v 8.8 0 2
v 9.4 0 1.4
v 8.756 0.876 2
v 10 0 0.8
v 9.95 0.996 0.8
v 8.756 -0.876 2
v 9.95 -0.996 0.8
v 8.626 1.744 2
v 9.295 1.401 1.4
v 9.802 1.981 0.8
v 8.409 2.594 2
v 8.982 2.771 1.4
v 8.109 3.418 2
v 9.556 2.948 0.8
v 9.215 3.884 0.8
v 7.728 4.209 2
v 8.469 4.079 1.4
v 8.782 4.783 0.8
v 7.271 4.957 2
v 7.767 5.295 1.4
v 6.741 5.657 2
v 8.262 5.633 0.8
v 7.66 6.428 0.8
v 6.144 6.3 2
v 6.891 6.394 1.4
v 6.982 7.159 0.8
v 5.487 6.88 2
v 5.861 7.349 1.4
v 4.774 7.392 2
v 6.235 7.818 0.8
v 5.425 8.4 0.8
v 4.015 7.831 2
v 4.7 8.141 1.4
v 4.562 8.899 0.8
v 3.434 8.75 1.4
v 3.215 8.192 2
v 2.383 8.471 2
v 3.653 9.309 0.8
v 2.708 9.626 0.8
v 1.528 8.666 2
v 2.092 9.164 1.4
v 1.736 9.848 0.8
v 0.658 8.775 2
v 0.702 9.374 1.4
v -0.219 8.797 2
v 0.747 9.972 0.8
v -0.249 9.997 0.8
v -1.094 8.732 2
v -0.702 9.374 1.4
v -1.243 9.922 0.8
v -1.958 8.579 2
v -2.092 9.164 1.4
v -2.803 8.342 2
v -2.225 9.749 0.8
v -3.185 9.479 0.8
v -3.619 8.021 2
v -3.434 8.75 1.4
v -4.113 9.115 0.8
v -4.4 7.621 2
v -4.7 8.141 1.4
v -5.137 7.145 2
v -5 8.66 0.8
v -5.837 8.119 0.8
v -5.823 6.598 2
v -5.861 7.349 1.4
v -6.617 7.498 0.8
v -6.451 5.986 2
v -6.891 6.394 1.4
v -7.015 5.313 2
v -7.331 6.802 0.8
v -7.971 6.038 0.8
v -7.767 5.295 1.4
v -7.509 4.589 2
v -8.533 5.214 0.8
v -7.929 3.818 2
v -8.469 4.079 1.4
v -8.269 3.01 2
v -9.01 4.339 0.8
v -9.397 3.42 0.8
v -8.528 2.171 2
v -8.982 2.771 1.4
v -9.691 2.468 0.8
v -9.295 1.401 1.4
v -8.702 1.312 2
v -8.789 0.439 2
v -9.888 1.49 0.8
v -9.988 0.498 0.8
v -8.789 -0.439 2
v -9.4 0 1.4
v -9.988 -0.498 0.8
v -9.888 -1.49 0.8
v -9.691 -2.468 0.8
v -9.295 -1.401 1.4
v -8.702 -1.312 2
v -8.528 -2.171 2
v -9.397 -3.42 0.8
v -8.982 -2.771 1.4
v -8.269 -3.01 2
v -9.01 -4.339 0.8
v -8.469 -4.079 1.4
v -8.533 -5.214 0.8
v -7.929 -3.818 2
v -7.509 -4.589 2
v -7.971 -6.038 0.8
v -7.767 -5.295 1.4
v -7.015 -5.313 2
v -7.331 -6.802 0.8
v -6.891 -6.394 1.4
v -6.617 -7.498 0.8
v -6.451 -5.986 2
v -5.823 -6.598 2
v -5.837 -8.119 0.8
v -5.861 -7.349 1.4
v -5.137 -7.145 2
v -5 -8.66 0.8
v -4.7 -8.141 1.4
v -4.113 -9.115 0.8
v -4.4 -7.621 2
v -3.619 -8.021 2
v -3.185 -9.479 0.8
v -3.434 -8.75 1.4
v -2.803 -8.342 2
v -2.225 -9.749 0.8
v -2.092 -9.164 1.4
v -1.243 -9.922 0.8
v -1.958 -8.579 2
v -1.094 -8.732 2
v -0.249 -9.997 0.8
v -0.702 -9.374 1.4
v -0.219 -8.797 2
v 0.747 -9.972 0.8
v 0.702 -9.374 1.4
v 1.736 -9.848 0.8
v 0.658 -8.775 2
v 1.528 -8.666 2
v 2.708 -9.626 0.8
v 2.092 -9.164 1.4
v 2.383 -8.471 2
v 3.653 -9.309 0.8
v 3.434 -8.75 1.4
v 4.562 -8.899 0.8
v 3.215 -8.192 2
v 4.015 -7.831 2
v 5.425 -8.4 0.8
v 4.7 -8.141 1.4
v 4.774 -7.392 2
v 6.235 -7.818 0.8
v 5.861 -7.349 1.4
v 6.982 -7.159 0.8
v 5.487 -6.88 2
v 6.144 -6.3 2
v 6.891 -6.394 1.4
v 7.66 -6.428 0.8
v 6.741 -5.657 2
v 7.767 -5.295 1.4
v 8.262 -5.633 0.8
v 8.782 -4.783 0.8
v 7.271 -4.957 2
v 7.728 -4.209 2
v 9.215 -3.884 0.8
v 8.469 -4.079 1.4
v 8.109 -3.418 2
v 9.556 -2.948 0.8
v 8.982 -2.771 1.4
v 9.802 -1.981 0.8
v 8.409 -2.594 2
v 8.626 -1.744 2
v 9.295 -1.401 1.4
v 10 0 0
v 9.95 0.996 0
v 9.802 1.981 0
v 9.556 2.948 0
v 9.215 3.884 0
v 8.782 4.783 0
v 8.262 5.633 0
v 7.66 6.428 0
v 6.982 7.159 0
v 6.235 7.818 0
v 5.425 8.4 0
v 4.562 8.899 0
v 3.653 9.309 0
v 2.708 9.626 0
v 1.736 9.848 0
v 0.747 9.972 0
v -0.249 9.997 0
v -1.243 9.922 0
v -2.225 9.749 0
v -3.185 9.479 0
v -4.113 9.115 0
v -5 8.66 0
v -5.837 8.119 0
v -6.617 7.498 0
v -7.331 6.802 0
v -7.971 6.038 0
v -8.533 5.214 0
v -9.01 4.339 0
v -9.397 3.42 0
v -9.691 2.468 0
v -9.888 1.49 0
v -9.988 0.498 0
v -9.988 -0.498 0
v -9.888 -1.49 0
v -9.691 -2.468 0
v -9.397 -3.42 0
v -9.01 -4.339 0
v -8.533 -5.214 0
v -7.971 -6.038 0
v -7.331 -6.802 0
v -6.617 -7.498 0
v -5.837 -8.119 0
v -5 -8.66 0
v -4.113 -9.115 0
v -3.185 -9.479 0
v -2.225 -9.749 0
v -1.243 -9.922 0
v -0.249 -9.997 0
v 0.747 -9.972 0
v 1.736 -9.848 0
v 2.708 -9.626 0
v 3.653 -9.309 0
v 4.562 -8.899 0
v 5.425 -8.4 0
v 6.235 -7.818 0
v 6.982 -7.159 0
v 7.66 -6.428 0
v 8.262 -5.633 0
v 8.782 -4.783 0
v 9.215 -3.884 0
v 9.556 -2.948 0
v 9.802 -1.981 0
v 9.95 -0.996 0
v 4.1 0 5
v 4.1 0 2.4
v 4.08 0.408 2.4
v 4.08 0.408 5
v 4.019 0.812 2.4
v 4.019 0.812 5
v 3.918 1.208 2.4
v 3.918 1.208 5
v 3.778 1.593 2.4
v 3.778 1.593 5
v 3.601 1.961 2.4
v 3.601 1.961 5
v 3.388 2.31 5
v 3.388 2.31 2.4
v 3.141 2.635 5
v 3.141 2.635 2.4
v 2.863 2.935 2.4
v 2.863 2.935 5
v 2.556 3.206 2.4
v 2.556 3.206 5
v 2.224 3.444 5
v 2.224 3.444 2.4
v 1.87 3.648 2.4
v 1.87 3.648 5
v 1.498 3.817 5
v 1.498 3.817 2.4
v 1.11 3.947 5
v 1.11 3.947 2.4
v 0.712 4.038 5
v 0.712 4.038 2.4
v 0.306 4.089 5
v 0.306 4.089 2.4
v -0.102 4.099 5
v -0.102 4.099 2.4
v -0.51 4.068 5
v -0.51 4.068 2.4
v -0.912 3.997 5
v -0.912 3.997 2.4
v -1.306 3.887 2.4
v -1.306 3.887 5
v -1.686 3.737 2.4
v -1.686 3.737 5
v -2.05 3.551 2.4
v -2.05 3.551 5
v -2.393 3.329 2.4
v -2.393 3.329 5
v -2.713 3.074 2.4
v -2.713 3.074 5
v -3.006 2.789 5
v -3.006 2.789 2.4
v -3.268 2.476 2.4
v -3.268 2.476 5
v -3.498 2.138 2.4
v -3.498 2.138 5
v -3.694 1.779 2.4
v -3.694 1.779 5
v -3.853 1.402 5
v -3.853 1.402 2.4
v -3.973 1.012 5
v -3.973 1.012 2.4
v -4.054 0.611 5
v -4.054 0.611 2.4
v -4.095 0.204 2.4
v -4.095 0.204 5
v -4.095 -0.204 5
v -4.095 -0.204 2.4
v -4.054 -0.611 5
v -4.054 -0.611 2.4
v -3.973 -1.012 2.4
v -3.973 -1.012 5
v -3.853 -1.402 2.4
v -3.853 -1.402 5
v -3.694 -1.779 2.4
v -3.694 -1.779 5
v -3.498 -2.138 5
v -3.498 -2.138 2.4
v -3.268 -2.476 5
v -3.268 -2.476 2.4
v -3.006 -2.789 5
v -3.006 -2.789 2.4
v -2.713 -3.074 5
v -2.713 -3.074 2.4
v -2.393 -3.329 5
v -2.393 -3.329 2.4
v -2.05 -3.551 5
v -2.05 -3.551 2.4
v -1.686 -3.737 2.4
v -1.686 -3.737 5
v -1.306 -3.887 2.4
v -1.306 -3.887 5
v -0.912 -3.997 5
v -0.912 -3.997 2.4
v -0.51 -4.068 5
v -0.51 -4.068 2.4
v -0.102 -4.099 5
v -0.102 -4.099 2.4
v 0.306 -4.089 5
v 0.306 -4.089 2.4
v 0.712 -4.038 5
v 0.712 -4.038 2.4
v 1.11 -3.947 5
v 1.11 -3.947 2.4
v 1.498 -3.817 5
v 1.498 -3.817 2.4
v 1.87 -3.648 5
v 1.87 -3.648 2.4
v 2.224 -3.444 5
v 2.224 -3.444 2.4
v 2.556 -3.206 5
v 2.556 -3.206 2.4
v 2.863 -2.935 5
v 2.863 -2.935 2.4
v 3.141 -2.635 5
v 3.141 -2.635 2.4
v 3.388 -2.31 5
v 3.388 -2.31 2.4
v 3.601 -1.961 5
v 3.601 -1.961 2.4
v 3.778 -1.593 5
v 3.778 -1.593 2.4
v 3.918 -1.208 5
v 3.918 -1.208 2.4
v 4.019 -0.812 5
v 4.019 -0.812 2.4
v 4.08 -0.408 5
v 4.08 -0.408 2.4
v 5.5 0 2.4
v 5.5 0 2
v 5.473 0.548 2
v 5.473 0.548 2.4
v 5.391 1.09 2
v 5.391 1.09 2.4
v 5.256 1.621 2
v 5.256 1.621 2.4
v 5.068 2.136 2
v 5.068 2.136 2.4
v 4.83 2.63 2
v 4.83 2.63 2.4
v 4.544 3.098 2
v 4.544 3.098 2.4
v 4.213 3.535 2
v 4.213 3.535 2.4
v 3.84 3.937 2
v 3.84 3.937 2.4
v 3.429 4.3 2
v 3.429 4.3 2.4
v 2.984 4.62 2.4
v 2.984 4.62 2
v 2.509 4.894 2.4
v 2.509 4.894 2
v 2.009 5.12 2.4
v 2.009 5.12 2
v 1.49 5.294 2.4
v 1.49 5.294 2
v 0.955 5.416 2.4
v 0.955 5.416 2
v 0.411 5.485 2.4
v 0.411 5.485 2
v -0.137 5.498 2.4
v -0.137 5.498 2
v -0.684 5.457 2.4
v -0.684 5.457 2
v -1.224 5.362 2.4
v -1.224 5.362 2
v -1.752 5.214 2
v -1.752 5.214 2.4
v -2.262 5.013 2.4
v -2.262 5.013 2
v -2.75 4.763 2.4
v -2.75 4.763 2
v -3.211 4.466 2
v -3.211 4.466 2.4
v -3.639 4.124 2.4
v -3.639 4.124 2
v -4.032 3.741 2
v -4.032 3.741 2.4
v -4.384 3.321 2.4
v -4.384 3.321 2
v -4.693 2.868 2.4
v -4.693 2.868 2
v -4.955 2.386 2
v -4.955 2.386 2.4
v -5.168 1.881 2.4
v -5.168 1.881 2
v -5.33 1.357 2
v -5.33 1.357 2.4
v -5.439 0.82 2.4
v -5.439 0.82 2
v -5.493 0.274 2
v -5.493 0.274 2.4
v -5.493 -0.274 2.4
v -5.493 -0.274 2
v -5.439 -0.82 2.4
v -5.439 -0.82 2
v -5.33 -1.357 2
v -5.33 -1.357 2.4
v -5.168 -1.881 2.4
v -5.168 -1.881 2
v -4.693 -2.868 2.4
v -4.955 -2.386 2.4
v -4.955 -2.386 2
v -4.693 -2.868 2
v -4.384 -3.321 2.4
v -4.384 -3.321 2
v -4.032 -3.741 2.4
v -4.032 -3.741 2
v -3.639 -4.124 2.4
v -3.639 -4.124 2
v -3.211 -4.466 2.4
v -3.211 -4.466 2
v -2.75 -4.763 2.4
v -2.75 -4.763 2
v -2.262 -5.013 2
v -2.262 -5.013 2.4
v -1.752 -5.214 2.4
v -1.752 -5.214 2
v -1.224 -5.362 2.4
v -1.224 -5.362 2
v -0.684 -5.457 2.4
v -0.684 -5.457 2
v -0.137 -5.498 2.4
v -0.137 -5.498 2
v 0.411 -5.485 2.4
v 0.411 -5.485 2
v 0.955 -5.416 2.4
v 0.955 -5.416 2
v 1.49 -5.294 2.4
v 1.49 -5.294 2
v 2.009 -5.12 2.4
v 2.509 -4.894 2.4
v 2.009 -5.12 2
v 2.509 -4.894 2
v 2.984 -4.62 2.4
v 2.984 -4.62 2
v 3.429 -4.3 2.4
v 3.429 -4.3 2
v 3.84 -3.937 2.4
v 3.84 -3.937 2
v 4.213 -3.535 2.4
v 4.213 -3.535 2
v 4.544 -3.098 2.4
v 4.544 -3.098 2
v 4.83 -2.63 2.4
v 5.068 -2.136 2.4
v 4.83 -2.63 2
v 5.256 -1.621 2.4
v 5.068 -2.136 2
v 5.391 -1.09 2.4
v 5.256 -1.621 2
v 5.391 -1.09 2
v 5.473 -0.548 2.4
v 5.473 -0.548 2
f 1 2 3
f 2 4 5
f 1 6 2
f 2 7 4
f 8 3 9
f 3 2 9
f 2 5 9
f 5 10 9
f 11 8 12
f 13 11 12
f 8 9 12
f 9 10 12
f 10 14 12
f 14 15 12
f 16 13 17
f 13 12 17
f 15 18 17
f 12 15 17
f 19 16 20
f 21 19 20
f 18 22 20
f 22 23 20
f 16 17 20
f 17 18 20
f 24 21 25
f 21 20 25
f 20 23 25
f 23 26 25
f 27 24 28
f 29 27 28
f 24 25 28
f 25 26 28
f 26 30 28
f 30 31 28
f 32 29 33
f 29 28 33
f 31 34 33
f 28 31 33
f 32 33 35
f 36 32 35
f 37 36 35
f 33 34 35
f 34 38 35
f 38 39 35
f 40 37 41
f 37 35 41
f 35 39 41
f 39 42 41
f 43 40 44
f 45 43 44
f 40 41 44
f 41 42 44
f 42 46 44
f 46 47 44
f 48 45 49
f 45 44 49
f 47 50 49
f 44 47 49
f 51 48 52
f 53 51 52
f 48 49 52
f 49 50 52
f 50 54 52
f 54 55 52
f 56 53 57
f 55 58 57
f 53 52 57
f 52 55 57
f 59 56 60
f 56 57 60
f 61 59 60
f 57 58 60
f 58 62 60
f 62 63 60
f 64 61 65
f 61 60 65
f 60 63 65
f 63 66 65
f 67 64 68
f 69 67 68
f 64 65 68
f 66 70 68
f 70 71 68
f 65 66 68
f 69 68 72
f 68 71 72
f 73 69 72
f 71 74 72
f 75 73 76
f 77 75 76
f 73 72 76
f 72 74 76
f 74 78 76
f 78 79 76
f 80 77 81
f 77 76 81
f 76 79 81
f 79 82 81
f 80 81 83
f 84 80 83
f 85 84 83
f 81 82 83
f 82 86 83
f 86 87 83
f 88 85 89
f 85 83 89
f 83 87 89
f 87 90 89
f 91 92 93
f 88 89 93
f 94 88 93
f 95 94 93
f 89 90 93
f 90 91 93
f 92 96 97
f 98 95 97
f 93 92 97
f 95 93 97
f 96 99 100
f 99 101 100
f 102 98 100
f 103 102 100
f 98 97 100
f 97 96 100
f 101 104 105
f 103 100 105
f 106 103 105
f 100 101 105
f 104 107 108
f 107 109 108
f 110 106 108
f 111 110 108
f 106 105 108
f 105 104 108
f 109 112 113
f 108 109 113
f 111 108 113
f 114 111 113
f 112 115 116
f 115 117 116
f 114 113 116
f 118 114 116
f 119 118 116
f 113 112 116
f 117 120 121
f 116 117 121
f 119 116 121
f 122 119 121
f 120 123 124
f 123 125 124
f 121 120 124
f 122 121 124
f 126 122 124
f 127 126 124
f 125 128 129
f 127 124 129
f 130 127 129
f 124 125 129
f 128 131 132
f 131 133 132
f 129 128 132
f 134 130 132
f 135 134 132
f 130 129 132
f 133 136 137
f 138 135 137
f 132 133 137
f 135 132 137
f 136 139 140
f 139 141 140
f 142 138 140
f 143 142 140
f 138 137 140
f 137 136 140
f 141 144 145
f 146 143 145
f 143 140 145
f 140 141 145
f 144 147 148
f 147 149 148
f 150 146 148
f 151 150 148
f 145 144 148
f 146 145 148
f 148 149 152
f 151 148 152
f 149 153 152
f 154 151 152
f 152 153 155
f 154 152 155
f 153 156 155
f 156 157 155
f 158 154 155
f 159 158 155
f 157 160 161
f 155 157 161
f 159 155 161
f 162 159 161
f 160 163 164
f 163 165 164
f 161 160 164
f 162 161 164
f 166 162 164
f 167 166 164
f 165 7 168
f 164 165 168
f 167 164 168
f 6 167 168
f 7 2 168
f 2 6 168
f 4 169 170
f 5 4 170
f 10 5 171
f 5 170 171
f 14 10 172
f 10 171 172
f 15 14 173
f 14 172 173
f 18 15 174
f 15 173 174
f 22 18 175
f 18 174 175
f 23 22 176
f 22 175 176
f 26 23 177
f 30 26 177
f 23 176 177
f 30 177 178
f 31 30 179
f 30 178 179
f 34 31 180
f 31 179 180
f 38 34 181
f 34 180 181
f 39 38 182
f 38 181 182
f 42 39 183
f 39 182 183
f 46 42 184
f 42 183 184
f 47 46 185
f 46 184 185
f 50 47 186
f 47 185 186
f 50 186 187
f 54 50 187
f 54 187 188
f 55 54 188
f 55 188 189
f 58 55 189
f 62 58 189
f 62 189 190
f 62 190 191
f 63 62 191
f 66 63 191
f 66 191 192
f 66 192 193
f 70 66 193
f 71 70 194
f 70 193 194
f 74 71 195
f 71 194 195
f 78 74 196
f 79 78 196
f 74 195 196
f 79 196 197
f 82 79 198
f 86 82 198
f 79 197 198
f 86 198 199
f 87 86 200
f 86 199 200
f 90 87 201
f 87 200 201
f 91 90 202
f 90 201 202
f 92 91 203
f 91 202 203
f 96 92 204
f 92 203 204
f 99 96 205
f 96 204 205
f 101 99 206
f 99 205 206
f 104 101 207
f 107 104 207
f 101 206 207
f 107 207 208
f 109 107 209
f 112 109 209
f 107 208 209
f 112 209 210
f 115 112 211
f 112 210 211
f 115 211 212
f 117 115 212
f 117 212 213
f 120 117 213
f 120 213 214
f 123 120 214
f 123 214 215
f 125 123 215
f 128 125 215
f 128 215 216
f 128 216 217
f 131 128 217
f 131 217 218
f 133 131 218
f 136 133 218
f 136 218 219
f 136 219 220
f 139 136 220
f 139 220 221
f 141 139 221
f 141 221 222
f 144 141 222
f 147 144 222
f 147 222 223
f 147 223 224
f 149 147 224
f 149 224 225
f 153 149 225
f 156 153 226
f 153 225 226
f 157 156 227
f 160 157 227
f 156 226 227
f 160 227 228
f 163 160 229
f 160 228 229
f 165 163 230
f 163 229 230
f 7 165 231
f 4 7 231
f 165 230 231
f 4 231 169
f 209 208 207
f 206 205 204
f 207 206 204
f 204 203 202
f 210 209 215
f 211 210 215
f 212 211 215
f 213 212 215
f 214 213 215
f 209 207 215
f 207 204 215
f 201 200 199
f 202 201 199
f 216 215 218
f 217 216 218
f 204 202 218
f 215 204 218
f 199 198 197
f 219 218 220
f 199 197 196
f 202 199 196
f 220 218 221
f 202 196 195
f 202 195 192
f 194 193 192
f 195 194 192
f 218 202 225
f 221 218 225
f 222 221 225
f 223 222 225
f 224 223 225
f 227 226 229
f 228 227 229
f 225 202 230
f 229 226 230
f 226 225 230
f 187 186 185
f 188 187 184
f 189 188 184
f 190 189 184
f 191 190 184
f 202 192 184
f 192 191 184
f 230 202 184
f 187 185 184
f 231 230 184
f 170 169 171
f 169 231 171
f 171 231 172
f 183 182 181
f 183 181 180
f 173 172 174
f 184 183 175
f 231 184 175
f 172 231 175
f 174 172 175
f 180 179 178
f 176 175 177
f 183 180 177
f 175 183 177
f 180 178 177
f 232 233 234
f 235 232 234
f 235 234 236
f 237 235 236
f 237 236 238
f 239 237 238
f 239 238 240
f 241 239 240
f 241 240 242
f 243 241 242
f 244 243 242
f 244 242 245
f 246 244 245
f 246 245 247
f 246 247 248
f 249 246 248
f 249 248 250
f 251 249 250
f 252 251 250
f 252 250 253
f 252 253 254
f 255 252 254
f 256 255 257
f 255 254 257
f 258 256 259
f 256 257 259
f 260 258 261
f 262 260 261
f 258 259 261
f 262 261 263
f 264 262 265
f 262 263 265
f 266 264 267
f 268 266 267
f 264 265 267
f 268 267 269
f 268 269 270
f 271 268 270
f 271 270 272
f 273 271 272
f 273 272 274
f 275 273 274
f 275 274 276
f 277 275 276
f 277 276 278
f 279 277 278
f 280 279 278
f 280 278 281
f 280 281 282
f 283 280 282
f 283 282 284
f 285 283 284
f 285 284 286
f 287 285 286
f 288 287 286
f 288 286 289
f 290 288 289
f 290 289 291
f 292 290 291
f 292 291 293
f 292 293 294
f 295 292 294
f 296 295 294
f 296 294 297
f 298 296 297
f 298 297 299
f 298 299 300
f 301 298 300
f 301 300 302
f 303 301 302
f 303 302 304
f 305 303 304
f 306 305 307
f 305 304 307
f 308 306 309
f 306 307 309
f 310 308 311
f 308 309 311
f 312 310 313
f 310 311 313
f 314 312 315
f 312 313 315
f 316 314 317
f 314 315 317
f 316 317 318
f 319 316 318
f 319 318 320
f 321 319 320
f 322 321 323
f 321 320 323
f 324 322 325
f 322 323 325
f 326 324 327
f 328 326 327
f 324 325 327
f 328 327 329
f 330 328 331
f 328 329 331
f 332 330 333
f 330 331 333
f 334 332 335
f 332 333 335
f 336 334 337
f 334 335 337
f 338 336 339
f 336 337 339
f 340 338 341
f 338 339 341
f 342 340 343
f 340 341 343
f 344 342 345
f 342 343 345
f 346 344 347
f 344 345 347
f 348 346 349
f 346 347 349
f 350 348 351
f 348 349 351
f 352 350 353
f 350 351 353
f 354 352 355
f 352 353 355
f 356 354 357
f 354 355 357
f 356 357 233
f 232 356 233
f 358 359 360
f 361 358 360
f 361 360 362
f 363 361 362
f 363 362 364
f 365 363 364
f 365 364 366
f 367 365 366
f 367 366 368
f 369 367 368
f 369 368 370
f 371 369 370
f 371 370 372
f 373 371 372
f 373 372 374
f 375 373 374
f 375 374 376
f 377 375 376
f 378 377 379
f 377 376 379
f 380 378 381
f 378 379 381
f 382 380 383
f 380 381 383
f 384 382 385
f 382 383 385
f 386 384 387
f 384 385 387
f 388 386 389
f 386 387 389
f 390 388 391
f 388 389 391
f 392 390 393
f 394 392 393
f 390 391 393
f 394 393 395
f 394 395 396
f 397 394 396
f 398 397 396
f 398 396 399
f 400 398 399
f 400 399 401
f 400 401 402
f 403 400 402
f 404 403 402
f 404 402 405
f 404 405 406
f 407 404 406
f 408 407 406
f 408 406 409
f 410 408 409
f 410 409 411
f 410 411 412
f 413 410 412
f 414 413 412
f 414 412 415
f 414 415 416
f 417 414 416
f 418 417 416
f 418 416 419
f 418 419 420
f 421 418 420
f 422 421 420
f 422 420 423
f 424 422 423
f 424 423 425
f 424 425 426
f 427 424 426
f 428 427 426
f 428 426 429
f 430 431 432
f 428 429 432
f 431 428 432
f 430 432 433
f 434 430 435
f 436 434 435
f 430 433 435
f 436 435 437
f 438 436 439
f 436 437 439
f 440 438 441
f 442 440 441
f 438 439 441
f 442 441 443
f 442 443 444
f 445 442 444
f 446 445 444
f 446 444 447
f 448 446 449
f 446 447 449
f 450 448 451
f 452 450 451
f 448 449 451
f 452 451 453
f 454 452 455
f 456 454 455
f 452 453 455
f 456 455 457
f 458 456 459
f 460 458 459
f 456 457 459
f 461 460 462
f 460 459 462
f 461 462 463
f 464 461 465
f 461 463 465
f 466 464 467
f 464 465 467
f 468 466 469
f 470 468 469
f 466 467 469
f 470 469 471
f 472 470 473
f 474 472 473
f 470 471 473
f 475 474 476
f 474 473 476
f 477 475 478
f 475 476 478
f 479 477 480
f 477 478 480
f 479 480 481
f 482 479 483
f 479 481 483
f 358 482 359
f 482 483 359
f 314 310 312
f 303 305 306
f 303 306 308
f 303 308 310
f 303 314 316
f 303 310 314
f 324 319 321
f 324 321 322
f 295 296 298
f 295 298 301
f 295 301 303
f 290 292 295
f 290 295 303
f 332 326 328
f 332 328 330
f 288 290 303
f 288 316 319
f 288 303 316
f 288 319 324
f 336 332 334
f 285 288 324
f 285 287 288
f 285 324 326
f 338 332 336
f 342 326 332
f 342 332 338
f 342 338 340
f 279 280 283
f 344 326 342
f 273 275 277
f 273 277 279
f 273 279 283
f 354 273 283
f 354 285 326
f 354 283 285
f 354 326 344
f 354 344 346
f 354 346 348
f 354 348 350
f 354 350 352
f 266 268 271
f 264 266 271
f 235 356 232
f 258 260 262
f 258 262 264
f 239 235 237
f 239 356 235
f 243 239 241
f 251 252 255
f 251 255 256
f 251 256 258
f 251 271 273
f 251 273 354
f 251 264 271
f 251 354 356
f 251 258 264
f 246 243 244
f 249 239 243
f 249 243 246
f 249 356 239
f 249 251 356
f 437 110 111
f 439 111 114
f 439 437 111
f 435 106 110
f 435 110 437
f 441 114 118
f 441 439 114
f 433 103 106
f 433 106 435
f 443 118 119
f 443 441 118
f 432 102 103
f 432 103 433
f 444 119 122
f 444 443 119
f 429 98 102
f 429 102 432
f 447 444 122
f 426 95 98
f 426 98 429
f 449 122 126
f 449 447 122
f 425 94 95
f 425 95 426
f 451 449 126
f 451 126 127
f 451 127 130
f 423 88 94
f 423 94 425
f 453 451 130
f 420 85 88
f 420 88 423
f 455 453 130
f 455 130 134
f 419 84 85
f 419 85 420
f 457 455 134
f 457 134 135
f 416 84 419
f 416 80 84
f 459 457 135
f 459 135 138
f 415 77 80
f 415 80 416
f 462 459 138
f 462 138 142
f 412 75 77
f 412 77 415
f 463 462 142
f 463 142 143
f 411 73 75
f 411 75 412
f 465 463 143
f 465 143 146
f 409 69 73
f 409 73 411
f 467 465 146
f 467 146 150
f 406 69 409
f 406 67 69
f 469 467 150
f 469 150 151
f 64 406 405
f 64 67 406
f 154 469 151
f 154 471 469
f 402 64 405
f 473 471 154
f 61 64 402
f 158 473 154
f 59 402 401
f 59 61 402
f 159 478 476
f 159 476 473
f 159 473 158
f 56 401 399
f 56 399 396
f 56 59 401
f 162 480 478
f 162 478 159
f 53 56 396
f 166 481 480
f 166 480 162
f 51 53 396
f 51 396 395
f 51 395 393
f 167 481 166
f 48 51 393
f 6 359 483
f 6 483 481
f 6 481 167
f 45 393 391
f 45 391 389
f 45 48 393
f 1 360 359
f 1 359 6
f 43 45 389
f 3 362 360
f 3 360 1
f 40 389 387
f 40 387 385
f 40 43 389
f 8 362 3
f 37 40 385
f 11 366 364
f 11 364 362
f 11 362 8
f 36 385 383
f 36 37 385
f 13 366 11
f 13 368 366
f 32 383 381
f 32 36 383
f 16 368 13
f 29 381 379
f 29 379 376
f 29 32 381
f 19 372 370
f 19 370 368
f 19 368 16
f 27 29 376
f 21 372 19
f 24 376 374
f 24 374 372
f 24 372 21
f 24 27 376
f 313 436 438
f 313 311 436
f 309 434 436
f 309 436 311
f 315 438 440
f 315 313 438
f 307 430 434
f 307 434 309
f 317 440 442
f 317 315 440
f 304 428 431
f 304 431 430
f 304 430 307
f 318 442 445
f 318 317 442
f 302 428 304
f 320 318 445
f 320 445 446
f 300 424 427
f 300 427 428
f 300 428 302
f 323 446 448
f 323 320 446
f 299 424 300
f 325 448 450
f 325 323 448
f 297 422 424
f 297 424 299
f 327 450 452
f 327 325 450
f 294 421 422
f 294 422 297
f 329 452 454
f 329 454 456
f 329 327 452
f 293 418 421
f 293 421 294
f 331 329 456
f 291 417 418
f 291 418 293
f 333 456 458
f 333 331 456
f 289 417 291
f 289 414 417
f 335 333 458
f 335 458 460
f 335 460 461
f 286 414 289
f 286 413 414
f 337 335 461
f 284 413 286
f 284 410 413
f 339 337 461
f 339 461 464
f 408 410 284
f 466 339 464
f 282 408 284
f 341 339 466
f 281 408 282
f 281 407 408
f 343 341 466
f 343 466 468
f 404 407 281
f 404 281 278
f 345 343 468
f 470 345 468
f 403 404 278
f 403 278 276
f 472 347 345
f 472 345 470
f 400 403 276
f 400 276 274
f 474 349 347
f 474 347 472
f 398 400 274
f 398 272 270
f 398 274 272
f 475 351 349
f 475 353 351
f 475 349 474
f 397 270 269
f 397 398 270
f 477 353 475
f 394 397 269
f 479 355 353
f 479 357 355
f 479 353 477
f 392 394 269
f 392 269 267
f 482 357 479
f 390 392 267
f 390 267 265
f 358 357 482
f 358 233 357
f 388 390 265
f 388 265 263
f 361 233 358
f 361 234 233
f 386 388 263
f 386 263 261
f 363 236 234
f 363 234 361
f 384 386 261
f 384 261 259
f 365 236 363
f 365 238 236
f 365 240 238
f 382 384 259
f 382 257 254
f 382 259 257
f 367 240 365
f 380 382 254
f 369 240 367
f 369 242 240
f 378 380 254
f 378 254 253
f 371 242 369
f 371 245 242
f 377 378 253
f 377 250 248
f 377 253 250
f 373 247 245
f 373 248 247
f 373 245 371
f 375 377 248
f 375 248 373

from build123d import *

# Parameters (mm, degrees)
F0_R     = 10
F0_R_2   = 5.5
F0_R_3   = 4.1
F1_DEPTH = 2
F2_DEPTH = 5
F3_SIZE  = 1.2
F4_DEPTH = 2.4


with BuildPart() as f1:
    # F0 (on Top) → F1 (new body)
    with BuildSketch(Plane.XY):
        Circle(F0_R)
        Circle(F0_R_2, mode=Mode.SUBTRACT)
        Circle(F0_R_3)
        Circle(F0_R_2)
        Circle(F0_R_3, mode=Mode.SUBTRACT)
    extrude(amount=F1_DEPTH)

    # F0 (on Top) → F2 (join)
    with BuildSketch(Plane.XY):
        Circle(F0_R_3)
    extrude(amount=F2_DEPTH)

    # F3
    f3_edges = [f1.edges().sort_by_distance(p)[0] for p in [
        (-10, 0, 2),
    ]]
    chamfer(f3_edges, length=F3_SIZE)

    # F0 (on Top) → F4 (join)
    with BuildSketch(Plane.XY):
        Circle(F0_R_2)
        Circle(F0_R_3, mode=Mode.SUBTRACT)
    extrude(amount=F4_DEPTH)


solid = f1.part
